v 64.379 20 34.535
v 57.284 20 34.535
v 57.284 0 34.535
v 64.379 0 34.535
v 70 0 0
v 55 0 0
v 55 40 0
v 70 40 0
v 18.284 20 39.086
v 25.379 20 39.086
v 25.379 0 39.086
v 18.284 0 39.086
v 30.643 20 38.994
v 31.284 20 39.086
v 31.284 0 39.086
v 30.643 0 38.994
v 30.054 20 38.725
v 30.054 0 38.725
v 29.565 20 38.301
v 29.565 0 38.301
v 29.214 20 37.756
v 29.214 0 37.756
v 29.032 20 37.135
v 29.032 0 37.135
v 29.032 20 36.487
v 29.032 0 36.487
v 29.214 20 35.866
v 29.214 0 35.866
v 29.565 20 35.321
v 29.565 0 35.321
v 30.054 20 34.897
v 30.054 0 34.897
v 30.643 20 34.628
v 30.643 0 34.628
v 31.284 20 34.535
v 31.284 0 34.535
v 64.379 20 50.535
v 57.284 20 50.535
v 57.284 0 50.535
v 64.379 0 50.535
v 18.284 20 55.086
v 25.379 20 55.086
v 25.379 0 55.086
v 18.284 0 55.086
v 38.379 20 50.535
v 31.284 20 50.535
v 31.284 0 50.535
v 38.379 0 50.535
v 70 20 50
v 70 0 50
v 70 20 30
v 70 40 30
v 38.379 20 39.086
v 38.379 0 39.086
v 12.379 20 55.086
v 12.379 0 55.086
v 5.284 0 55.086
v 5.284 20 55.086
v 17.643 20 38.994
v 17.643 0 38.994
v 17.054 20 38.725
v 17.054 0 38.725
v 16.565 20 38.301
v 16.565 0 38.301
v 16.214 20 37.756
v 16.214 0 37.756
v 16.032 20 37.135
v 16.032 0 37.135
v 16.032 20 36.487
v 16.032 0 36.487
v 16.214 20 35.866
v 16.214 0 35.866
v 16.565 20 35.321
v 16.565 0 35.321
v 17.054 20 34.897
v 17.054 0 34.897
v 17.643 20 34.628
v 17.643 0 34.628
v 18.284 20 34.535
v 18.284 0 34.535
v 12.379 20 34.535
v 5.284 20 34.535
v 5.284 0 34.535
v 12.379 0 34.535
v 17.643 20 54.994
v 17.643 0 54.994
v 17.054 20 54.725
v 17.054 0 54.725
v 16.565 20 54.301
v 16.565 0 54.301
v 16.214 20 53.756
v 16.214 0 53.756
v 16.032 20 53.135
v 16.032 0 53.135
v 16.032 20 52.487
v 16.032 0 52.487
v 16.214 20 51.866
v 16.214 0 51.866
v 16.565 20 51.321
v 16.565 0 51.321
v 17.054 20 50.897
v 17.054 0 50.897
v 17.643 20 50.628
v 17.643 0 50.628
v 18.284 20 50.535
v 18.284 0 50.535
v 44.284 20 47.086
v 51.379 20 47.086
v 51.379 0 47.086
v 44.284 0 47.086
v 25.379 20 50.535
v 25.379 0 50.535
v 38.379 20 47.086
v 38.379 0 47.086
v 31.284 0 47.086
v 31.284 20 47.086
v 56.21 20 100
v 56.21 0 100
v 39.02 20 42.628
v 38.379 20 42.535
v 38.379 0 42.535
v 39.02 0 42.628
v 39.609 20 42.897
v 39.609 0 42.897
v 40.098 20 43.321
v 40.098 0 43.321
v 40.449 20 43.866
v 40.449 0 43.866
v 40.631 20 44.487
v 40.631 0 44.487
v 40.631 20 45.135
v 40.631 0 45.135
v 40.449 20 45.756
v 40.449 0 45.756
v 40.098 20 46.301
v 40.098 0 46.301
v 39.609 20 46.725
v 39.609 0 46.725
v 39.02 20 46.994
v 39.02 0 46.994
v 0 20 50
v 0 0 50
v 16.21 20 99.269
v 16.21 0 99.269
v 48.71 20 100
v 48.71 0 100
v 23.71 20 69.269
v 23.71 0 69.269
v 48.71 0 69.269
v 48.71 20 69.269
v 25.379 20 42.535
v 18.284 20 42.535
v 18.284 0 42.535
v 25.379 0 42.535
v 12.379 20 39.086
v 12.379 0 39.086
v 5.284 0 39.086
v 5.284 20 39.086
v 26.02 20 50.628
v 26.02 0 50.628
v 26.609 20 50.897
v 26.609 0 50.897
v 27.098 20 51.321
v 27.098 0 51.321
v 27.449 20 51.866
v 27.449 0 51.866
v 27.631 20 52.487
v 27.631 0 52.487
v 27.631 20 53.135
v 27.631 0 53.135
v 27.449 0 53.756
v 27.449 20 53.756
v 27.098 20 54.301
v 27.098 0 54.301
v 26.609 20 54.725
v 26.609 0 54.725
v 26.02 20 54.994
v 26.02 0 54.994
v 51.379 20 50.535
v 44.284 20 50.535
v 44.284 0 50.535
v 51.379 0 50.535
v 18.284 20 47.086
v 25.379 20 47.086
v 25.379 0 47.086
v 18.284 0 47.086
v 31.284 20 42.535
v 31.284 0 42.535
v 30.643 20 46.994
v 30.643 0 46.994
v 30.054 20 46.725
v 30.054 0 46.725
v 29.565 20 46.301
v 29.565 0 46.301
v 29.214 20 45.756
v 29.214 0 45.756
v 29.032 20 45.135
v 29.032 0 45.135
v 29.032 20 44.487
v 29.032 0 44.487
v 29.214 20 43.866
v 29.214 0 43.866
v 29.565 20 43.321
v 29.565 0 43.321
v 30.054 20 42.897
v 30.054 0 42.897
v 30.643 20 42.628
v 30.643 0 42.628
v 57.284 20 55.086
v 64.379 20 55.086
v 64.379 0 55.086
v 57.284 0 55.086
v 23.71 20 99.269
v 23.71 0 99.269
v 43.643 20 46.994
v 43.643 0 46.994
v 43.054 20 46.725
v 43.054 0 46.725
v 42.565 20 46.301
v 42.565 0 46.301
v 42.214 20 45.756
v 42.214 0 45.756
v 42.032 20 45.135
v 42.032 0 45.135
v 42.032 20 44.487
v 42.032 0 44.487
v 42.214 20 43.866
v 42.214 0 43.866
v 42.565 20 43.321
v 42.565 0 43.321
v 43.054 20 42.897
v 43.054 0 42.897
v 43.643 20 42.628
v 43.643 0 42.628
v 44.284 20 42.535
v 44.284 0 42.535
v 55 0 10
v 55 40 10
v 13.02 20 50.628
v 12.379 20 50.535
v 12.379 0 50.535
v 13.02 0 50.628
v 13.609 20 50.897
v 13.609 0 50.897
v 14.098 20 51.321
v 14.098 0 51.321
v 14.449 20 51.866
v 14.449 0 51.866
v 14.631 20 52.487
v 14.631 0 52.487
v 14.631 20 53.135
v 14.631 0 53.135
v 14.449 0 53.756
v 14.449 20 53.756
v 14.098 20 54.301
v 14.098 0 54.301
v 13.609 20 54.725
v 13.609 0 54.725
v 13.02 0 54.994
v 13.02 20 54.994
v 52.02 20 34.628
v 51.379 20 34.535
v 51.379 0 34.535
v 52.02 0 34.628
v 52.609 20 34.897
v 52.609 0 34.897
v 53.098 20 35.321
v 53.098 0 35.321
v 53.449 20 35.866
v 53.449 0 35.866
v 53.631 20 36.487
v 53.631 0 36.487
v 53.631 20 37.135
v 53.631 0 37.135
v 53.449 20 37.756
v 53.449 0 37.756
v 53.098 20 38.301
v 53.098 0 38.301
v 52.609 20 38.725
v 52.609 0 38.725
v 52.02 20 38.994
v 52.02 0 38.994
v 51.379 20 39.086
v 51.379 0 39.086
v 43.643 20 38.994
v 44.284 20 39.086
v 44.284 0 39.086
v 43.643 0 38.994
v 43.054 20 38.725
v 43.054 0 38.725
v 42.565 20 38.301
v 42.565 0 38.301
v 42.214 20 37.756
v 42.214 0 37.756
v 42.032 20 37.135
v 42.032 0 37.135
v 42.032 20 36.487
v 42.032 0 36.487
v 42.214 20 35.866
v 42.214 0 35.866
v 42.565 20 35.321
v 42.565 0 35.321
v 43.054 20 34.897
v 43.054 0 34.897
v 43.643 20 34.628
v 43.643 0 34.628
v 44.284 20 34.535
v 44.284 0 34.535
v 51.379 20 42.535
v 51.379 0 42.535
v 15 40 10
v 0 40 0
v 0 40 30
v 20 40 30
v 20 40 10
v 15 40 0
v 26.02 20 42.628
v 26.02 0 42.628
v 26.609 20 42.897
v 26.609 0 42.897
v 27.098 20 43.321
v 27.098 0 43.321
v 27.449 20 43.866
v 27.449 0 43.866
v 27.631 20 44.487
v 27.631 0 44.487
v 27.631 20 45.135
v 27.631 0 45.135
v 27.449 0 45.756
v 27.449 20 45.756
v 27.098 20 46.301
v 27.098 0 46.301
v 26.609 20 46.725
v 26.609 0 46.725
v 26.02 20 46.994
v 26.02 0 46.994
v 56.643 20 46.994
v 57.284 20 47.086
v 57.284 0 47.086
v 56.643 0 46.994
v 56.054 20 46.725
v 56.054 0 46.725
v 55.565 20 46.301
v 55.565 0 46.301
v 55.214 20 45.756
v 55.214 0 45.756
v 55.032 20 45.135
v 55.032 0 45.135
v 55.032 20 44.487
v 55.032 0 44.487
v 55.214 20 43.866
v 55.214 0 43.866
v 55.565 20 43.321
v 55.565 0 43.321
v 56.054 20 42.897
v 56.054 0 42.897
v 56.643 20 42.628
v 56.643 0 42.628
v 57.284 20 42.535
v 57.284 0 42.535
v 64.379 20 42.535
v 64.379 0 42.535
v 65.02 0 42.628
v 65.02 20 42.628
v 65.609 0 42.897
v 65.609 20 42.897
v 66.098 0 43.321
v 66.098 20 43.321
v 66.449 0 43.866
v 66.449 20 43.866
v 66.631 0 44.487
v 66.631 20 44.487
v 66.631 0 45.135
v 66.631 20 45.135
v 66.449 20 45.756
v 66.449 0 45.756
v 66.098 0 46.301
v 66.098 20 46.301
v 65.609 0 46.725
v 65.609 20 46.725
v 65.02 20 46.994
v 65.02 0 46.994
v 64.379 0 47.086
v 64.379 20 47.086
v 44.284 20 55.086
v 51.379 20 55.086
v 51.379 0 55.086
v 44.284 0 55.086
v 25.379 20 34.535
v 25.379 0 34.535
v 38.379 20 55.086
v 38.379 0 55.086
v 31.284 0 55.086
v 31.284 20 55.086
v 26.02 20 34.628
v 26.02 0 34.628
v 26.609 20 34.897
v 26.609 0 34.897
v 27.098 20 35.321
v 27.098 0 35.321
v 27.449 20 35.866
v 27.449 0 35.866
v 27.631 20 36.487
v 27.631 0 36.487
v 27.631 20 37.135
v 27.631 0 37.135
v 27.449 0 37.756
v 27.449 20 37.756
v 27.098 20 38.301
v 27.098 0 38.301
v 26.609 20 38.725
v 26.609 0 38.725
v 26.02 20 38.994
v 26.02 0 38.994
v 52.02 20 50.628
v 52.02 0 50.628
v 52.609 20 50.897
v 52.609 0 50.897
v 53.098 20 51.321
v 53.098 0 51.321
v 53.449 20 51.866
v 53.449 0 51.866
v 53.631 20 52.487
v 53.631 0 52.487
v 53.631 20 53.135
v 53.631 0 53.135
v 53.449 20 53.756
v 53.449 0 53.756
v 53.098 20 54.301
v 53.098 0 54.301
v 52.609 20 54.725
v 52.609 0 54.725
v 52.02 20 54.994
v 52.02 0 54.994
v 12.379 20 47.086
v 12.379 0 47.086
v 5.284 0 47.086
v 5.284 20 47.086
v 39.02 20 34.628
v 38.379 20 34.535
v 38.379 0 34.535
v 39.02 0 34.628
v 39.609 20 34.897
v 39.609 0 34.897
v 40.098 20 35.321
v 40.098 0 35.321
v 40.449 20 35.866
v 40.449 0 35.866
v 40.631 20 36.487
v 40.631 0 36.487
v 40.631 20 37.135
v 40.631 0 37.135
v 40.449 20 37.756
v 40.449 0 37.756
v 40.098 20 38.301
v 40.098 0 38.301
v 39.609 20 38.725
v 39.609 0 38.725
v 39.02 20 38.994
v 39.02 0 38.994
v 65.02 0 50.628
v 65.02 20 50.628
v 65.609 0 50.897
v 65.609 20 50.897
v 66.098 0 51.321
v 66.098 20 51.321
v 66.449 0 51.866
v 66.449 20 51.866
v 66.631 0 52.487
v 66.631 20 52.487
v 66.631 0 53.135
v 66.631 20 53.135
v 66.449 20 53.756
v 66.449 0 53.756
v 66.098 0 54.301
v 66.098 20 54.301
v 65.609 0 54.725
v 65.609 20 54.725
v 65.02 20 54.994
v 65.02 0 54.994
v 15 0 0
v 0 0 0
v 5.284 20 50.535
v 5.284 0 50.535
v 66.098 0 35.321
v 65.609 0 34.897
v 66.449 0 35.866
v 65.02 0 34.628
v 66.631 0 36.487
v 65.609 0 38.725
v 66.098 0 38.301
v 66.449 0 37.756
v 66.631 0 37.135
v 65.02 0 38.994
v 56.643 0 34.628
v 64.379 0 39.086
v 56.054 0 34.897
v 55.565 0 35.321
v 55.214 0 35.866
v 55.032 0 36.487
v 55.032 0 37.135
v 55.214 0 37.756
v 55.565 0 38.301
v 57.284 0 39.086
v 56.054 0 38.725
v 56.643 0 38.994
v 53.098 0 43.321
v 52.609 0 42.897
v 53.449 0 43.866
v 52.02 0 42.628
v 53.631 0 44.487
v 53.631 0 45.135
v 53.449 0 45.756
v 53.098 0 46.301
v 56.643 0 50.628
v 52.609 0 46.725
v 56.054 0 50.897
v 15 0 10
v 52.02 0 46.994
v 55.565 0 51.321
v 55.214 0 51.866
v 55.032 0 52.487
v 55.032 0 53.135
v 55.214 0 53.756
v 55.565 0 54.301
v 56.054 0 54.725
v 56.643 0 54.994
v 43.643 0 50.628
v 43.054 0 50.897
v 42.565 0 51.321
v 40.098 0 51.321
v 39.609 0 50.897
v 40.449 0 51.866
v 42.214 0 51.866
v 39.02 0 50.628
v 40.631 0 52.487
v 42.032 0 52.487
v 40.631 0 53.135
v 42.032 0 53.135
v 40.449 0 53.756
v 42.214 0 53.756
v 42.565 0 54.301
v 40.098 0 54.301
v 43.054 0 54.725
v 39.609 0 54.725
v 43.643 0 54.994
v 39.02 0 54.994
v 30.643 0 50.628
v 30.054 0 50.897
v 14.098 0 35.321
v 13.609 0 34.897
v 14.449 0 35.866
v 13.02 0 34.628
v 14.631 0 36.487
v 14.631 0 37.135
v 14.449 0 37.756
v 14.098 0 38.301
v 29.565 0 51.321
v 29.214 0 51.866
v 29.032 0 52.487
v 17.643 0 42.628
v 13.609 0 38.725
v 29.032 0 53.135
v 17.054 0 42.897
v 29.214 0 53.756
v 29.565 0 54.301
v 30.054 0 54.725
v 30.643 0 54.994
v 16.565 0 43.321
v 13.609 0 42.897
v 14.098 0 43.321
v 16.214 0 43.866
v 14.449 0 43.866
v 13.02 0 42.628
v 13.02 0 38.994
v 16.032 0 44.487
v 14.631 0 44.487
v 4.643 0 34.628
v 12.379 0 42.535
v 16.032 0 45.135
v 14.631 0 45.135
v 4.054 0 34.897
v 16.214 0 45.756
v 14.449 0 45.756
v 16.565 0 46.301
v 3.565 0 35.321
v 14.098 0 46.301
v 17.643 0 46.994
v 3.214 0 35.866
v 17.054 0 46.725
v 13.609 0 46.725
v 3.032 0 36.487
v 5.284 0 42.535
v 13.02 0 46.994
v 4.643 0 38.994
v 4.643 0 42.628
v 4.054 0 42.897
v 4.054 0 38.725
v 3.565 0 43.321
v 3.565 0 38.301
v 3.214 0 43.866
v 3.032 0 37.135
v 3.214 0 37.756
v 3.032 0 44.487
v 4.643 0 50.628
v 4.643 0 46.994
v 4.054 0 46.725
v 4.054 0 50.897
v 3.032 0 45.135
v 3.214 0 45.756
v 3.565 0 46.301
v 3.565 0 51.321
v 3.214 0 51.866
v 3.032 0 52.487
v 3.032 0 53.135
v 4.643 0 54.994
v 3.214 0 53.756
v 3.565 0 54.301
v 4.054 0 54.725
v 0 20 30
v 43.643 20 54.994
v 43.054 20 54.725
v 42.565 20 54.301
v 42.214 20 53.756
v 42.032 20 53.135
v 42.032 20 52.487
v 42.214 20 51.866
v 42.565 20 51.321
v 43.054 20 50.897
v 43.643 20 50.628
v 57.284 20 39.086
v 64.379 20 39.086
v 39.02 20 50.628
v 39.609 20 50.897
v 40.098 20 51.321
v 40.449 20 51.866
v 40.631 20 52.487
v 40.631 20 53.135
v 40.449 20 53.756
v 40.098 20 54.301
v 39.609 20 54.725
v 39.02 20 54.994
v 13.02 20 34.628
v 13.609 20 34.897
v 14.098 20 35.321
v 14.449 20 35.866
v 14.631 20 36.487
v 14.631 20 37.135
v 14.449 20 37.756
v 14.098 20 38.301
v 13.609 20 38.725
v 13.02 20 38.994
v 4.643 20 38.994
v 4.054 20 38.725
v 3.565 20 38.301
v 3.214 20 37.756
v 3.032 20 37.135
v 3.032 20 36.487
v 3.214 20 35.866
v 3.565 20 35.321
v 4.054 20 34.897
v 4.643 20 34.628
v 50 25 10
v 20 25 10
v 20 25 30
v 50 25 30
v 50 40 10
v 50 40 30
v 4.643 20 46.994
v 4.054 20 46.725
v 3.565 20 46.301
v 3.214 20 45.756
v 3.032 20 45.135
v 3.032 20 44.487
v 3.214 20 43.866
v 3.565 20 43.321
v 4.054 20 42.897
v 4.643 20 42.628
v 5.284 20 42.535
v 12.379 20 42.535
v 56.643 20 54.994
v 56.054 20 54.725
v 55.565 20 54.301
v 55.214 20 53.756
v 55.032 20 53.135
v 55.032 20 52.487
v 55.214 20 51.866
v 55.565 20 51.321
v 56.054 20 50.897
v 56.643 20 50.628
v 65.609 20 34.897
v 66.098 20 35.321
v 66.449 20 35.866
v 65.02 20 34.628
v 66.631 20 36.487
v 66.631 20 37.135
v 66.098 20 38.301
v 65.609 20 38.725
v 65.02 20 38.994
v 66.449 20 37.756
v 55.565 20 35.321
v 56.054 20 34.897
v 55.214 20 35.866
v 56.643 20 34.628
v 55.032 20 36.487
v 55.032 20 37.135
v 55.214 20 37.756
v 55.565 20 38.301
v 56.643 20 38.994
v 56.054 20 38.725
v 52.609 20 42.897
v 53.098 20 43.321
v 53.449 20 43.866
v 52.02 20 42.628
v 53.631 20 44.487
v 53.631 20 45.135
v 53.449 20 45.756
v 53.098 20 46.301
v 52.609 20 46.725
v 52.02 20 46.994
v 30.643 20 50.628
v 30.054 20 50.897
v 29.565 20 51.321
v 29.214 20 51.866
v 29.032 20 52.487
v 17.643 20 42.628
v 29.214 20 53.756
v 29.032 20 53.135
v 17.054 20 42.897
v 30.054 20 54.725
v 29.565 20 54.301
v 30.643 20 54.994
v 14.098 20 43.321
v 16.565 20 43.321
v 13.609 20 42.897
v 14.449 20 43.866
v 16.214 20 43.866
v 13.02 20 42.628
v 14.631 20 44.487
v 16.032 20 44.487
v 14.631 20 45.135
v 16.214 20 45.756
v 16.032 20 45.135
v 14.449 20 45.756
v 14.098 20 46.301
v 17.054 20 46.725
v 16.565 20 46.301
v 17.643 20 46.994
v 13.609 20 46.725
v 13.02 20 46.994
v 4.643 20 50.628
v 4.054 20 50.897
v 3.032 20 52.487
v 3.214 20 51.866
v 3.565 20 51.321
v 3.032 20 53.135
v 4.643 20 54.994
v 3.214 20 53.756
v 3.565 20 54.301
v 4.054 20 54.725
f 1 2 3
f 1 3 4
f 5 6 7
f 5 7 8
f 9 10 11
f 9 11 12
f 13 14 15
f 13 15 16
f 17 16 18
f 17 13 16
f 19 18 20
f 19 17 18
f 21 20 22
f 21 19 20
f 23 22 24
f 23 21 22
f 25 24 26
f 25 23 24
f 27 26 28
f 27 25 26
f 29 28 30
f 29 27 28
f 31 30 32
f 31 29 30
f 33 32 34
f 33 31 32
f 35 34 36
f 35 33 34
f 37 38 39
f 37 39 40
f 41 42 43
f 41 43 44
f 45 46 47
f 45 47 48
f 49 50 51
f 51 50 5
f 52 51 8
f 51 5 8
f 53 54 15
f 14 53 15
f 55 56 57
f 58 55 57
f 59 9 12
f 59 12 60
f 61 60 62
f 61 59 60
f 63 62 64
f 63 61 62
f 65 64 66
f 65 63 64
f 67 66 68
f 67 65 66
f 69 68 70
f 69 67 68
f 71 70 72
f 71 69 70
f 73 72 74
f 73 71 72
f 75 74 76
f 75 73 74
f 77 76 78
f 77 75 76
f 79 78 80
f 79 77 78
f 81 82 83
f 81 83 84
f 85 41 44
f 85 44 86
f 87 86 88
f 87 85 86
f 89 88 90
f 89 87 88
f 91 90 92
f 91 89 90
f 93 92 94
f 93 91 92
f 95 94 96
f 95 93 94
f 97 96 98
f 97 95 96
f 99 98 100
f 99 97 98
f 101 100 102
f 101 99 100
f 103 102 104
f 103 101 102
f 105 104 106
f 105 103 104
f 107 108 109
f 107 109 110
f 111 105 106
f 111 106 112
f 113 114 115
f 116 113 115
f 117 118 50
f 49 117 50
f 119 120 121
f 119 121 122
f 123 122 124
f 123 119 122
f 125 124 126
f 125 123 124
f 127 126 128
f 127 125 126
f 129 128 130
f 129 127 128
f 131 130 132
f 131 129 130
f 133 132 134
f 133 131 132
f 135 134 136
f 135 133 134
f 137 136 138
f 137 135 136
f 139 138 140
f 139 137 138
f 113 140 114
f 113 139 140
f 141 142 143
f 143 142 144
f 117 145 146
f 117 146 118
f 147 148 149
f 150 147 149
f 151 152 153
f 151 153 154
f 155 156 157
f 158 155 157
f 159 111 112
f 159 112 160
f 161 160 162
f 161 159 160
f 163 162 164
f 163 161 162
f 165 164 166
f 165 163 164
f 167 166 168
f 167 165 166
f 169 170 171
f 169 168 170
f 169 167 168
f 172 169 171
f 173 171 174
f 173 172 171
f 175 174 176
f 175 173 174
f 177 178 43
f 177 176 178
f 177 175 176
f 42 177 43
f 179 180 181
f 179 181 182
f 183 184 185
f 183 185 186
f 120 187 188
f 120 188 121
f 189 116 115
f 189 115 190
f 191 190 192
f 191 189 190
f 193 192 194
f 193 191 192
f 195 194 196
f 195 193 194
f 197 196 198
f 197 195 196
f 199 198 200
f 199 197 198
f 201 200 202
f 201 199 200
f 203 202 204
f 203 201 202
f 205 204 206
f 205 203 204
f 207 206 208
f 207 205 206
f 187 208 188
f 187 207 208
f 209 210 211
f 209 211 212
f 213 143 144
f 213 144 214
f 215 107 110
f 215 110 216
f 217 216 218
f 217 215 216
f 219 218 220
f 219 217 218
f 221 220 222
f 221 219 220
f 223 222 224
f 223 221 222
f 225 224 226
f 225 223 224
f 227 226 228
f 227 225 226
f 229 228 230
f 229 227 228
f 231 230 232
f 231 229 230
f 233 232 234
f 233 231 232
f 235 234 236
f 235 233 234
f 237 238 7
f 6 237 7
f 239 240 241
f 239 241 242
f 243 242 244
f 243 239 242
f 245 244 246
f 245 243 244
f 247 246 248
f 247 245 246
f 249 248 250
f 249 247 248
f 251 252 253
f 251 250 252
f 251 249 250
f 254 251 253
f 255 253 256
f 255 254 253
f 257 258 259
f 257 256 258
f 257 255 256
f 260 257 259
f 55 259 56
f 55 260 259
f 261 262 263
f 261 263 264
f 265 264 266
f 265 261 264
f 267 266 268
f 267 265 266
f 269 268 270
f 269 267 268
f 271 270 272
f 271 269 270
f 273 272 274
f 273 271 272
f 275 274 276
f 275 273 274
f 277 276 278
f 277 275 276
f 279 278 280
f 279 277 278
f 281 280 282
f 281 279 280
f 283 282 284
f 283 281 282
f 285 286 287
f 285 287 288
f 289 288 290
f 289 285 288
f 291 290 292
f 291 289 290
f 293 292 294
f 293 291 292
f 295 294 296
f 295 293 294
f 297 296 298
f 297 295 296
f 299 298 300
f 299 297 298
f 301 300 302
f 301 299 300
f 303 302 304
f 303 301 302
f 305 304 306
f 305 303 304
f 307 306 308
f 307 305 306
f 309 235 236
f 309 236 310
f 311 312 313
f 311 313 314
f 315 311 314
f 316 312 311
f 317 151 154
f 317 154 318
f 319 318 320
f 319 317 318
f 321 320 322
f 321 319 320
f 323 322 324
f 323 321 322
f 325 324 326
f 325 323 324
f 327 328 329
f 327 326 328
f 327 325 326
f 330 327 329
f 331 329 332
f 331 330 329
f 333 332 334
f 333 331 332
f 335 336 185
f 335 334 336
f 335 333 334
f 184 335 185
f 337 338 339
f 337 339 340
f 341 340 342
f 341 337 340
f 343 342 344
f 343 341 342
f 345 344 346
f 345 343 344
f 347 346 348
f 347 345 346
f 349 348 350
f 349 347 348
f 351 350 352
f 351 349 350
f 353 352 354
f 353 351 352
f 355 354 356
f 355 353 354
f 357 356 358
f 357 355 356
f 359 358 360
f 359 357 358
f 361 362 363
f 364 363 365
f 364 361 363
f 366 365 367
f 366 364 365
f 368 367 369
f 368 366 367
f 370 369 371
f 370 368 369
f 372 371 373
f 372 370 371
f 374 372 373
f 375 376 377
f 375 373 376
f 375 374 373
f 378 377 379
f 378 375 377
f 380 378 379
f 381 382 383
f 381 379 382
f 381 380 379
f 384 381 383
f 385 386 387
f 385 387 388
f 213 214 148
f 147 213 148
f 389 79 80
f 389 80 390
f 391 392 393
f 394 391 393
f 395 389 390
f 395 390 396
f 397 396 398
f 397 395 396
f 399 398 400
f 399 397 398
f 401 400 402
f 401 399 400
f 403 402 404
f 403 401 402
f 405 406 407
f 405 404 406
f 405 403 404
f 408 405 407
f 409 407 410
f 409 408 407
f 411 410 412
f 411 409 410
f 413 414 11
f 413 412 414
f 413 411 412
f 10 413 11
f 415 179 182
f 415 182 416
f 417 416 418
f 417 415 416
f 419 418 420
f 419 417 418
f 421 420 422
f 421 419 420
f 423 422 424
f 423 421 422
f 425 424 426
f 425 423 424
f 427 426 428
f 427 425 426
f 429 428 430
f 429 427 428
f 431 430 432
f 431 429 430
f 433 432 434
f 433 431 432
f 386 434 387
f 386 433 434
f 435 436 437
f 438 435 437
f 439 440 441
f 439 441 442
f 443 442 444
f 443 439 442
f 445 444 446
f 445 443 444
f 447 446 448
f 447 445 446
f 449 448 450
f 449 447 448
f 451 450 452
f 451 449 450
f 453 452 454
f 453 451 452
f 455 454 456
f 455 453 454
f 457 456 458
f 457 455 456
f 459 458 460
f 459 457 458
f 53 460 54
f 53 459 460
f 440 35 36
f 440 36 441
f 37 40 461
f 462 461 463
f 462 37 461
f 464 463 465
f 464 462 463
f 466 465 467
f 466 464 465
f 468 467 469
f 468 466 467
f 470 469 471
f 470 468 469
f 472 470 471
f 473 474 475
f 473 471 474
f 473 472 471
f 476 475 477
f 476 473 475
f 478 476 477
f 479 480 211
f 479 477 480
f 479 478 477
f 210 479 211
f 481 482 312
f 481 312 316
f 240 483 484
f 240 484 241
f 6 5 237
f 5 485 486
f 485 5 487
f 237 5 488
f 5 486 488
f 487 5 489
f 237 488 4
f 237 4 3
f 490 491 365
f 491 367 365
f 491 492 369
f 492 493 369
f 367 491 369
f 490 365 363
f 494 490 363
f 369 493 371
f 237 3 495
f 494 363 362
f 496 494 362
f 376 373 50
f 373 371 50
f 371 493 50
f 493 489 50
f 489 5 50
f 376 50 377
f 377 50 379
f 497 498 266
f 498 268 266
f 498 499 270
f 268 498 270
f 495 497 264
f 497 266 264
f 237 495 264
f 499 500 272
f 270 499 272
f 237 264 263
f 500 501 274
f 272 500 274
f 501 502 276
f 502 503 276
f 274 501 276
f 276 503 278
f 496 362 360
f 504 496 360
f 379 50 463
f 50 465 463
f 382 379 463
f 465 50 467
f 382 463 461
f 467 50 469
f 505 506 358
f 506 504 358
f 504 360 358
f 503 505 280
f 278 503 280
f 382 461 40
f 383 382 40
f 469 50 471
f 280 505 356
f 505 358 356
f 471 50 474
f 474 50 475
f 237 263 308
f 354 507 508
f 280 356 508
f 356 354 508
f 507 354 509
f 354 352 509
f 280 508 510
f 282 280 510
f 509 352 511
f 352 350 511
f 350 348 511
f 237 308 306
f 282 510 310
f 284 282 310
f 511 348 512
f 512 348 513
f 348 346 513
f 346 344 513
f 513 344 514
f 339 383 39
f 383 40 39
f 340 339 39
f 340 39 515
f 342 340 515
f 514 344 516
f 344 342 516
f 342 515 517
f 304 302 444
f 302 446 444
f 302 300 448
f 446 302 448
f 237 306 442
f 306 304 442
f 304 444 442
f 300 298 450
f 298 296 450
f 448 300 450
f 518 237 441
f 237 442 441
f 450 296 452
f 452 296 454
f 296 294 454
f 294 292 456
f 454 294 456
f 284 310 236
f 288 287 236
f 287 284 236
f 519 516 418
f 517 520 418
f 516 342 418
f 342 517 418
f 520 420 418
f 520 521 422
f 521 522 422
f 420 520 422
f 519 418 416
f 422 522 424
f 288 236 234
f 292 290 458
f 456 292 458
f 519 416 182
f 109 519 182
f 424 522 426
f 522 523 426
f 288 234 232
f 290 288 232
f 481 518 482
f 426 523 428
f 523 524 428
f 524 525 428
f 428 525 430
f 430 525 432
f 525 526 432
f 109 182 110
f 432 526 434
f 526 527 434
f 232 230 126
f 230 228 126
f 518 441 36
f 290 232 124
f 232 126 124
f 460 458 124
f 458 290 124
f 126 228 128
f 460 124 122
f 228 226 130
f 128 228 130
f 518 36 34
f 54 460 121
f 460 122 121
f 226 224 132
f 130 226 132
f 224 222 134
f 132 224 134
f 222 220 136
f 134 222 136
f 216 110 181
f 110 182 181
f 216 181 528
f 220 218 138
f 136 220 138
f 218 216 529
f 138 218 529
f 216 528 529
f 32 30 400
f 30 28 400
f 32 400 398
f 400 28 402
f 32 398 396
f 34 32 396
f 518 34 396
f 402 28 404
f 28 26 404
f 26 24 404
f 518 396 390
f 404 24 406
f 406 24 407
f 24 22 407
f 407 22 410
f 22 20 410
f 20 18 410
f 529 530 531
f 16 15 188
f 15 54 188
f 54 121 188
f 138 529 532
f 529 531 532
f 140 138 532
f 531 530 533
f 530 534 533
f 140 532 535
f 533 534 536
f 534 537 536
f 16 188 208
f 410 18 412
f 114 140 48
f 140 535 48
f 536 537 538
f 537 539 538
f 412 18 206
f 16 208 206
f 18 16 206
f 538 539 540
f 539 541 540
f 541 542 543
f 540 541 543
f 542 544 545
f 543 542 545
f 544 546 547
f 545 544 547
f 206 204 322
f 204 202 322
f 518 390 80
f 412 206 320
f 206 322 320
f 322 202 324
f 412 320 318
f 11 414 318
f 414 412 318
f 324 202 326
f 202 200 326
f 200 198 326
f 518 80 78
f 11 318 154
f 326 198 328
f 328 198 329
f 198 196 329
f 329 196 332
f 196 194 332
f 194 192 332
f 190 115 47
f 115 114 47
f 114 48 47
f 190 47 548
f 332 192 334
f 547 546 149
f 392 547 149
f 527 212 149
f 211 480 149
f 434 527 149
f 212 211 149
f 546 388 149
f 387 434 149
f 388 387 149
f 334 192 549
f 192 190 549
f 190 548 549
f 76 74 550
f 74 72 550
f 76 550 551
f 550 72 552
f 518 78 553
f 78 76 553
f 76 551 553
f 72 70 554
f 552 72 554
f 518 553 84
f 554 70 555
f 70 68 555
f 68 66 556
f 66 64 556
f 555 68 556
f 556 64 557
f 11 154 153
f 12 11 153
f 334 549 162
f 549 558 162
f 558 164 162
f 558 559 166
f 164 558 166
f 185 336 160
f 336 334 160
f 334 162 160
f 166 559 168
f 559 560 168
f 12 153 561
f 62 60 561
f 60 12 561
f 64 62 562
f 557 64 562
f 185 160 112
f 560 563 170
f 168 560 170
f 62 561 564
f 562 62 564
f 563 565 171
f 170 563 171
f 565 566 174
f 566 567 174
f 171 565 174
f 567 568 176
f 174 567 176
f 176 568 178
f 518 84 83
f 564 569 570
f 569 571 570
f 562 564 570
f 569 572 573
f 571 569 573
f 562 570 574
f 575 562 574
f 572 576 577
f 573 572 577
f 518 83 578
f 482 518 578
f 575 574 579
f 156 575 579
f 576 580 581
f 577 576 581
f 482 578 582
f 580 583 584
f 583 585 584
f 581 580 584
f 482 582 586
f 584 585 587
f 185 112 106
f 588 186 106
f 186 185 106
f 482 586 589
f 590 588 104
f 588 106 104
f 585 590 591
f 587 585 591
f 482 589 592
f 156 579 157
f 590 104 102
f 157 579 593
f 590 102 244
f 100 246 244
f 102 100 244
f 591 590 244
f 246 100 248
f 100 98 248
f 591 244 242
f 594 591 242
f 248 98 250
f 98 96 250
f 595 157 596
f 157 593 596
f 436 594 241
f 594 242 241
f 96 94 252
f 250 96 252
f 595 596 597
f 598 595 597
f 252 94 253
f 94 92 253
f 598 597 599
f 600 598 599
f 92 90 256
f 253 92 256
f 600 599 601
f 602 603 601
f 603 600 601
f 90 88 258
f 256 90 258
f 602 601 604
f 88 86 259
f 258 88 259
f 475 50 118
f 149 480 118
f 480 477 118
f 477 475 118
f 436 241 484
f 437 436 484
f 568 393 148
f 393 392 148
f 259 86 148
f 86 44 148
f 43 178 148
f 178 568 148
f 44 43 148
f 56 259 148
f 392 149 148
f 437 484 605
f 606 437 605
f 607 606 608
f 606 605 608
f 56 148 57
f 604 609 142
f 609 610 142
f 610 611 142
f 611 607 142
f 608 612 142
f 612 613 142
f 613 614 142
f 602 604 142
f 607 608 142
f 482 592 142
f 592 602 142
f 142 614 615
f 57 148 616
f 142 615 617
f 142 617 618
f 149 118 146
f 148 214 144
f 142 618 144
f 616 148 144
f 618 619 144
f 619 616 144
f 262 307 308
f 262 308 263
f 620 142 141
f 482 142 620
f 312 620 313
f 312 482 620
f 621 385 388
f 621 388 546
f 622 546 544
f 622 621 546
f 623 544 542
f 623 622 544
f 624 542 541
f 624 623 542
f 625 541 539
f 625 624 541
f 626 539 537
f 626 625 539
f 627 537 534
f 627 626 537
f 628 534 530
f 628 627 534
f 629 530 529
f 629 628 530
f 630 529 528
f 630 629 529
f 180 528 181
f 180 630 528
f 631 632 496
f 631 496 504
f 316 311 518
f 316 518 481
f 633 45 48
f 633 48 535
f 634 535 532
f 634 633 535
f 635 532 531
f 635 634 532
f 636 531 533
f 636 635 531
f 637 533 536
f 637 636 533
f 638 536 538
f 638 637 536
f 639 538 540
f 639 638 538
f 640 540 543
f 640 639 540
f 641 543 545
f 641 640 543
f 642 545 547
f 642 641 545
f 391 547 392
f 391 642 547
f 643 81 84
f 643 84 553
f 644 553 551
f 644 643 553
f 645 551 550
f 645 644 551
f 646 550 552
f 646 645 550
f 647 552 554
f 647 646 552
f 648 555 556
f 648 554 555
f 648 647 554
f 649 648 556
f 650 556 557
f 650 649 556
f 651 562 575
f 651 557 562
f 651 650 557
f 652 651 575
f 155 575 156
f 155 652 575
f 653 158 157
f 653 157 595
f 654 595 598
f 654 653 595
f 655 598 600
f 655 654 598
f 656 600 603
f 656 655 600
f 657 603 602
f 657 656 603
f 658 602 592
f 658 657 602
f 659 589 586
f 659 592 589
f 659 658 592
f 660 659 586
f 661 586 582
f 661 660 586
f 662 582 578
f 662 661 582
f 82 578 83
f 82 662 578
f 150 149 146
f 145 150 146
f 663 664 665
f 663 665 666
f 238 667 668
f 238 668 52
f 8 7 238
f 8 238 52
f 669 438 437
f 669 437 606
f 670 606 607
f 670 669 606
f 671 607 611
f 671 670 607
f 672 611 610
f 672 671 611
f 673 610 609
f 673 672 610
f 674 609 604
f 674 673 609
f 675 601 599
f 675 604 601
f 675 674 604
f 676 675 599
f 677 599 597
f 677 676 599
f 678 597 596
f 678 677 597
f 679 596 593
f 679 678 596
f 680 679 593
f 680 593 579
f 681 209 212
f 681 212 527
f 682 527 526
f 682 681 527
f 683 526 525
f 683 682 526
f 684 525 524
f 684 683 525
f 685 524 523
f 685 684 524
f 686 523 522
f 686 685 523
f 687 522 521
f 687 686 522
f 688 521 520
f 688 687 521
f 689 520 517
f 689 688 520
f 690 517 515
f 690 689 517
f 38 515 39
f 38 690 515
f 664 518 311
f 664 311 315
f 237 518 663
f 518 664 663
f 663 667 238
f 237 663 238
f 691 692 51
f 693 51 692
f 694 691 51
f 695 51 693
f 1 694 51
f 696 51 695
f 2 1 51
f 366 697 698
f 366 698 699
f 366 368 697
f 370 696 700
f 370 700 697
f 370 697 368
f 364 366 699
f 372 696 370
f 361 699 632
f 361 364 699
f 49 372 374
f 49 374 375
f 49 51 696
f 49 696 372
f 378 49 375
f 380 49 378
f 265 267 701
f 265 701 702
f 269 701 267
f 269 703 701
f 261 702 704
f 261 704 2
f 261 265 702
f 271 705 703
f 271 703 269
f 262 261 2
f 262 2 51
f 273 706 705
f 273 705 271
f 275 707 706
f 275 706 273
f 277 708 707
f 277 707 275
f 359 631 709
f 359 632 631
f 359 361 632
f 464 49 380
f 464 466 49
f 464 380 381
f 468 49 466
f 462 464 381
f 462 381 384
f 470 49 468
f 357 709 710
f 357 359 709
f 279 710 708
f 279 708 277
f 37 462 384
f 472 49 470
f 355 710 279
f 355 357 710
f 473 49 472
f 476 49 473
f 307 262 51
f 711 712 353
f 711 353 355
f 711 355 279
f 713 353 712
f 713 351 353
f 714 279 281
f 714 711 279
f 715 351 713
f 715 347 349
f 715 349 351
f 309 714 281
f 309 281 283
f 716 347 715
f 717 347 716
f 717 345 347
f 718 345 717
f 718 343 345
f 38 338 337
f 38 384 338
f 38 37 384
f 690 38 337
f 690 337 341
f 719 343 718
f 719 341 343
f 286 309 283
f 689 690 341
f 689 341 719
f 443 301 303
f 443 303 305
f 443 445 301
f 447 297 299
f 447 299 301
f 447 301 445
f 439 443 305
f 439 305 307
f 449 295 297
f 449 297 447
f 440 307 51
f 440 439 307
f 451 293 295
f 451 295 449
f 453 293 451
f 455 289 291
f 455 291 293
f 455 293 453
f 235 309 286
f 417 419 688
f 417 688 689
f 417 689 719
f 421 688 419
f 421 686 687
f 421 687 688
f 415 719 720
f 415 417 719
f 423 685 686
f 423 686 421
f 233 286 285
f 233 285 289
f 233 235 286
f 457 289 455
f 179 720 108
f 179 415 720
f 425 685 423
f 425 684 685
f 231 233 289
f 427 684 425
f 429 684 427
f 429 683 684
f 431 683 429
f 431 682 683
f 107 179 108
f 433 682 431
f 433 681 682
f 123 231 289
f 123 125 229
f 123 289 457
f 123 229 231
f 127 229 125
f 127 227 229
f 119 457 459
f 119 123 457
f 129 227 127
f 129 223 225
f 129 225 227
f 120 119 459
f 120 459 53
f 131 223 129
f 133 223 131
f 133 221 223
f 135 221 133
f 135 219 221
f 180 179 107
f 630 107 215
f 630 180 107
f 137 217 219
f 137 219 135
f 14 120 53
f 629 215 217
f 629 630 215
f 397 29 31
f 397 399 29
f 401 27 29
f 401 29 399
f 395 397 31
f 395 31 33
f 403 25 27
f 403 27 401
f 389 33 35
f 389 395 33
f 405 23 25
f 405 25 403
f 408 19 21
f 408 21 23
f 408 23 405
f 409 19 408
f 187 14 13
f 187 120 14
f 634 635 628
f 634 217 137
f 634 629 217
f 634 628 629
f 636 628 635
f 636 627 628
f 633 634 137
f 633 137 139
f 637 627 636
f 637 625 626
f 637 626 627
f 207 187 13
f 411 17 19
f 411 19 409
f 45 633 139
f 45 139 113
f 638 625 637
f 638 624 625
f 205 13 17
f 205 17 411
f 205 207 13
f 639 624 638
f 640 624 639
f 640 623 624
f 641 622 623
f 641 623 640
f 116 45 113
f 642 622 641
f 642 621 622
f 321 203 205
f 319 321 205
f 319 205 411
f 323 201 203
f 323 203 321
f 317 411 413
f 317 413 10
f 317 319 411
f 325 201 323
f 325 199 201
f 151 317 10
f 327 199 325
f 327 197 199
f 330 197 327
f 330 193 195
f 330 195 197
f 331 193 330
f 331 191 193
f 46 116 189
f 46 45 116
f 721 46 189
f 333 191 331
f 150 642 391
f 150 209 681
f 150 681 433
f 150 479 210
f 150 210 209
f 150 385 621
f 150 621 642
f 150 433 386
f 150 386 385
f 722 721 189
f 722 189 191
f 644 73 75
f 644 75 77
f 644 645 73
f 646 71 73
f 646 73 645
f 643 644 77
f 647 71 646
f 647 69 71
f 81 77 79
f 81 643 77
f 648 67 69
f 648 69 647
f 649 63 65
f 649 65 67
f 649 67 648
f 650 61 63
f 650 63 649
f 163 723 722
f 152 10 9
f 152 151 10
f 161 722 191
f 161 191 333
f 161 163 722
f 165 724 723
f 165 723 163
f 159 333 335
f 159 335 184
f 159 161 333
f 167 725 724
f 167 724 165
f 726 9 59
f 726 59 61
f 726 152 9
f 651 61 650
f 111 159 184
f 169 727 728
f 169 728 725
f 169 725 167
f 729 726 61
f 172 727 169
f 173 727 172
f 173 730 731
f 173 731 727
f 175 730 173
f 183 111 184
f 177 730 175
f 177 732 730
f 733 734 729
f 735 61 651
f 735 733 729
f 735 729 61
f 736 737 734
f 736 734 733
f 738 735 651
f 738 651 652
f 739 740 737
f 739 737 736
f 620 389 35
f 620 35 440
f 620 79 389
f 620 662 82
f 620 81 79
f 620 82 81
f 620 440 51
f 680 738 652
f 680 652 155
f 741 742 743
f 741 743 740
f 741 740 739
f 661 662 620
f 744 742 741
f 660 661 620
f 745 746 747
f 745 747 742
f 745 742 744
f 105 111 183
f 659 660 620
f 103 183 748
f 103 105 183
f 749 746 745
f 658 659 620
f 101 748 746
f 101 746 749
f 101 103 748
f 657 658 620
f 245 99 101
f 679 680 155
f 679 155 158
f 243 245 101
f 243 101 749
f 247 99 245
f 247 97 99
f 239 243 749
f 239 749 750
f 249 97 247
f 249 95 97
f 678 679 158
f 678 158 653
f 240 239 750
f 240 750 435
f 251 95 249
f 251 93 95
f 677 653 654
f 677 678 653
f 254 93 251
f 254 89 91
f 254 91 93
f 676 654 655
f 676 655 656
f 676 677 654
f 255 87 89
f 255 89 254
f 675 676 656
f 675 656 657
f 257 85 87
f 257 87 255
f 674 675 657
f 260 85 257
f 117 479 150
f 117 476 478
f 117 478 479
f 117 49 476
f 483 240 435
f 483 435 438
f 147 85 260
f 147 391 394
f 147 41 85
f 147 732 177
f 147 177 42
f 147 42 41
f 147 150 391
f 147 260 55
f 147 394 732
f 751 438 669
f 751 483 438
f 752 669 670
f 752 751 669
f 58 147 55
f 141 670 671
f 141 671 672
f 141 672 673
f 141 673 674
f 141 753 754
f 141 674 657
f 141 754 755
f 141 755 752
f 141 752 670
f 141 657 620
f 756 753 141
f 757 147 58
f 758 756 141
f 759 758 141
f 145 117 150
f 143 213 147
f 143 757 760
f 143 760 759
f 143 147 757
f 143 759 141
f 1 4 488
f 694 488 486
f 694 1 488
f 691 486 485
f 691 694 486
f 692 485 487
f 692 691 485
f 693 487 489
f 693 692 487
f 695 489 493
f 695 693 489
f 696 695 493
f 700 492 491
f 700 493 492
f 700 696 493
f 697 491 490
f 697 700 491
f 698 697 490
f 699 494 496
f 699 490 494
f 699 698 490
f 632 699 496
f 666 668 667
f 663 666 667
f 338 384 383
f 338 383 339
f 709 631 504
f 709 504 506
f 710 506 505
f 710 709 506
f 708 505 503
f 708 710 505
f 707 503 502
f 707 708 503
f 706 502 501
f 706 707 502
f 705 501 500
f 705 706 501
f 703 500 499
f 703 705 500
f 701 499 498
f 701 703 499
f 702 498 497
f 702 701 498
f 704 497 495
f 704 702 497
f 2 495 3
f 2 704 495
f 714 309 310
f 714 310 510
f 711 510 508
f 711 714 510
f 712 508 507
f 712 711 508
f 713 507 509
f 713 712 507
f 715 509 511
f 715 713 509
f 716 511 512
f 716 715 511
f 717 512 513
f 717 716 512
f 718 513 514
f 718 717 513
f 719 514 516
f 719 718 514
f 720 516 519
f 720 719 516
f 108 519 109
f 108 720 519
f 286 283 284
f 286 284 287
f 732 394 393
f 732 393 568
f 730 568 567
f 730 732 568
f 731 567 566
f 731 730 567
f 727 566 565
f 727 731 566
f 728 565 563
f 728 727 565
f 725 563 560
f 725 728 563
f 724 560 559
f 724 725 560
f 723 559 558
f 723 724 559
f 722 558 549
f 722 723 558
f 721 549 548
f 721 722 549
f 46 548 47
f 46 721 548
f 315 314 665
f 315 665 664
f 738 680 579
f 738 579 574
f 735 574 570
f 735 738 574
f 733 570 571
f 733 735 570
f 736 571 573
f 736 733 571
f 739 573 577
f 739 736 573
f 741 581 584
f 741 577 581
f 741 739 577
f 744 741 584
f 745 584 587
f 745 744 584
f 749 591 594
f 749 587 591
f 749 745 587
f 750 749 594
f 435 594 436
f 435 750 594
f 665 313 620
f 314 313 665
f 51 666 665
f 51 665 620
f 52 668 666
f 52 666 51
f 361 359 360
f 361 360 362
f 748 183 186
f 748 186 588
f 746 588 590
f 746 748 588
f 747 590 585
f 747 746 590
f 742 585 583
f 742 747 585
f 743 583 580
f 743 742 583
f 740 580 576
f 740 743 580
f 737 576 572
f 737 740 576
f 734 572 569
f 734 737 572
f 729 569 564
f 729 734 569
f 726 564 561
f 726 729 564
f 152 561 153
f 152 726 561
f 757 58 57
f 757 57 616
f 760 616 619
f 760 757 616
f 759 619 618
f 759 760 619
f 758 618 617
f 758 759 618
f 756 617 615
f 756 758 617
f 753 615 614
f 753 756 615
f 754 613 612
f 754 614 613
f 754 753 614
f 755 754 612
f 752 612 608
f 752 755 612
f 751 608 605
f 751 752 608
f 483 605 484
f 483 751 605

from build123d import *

# Parameters (mm, degrees)
SKETCH2_W           = 70
SKETCH2_H           = 40
BOSS_EXTRUDE1_DEPTH = 50
SKETCH3_W           = 40
SKETCH3_H           = 10
CUT_EXTRUDE1_DEPTH  = 40
SKETCH4_W           = 30
SKETCH4_H           = 40
CUT_EXTRUDE2_DEPTH  = 15
SKETCH5_W           = 70
SKETCH5_H           = 20
CUT_EXTRUDE3_DEPTH  = 20
BOSS_EXTRUDE2_DEPTH = 20
CUT_EXTRUDE4_DEPTH  = 124.693168769


with BuildPart() as part:
    # Sketch2 → Boss-Extrude1 (new body)
    with BuildSketch(Plane.XY):
        with Locations((35, 20)):
            Rectangle(SKETCH2_W, SKETCH2_H)
    extrude(amount=BOSS_EXTRUDE1_DEPTH)

    # Sketch3 → Cut-Extrude1 (cut)
    with BuildSketch(Plane(origin=(0, 40, 0), x_dir=(1, 0, 0), z_dir=(0, 1, 0))):
        with Locations((35, -5)):
            Rectangle(SKETCH3_W, SKETCH3_H)
    extrude(amount=-CUT_EXTRUDE1_DEPTH, mode=Mode.SUBTRACT)

    # Sketch4 → Cut-Extrude2 (cut)
    with BuildSketch(Plane(origin=(0, 40, 0), x_dir=(1, 0, 0), z_dir=(0, 1, 0))):
        with Locations((35, -30)):
            Rectangle(SKETCH4_W, SKETCH4_H)
    extrude(amount=-CUT_EXTRUDE2_DEPTH, mode=Mode.SUBTRACT)

    # Sketch5 → Cut-Extrude3 (cut)
    with BuildSketch(Plane(origin=(0, 40, 0), x_dir=(1, 0, 0), z_dir=(0, 1, 0))):
        with Locations((35, -40)):
            Rectangle(SKETCH5_W, SKETCH5_H)
    extrude(amount=-CUT_EXTRUDE3_DEPTH, mode=Mode.SUBTRACT)

    # Sketch6 → Boss-Extrude2 (add)
    with BuildSketch(Plane.XZ):
        Polygon((0, 50), (16.209807748, 99.268768354), (23.709807748, 99.268768354), (23.709807748, 69.268768354), (48.709807748, 69.268768354), (48.709807748, 100), (56.209807748, 100), (70, 50), align=None)
    extrude(amount=-BOSS_EXTRUDE2_DEPTH)

    # Sketch7 → Cut-Extrude4 (cut, through all)
    with BuildSketch(Plane(origin=(0, 20, 0), x_dir=(1, 0, 0), z_dir=(0, 1, 0))):
        with BuildLine():
            Line((5.284369051, -34.535416774), (12.378641305, -34.535416774))
            ThreePointArc((12.378641305, -34.535416774), (14.654162594, -36.810938063), (12.378641305, -39.086459352))
            Line((12.378641305, -39.086459352), (5.284369051, -39.086459352))
            ThreePointArc((5.284369051, -39.086459352), (3.008847762, -36.810938063), (5.284369051, -34.535416774))
        make_face()
        with BuildLine():
            Line((18.284369051, -34.535416774), (25.378641305, -34.535416774))
            ThreePointArc((25.378641305, -34.535416774), (27.654162594, -36.810938063), (25.378641305, -39.086459352))
            Line((25.378641305, -39.086459352), (18.284369051, -39.086459352))
            ThreePointArc((18.284369051, -39.086459352), (16.008847762, -36.810938063), (18.284369051, -34.535416774))
        make_face()
        with BuildLine():
            Line((31.284369051, -34.535416774), (38.378641305, -34.535416774))
            ThreePointArc((38.378641305, -34.535416774), (40.654162594, -36.810938063), (38.378641305, -39.086459352))
            Line((38.378641305, -39.086459352), (31.284369051, -39.086459352))
            ThreePointArc((31.284369051, -39.086459352), (29.008847762, -36.810938063), (31.284369051, -34.535416774))
        make_face()
        with BuildLine():
            Line((44.284369051, -34.535416774), (51.378641305, -34.535416774))
            ThreePointArc((51.378641305, -34.535416774), (53.654162594, -36.810938063), (51.378641305, -39.086459352))
            Line((51.378641305, -39.086459352), (44.284369051, -39.086459352))
            ThreePointArc((44.284369051, -39.086459352), (42.008847762, -36.810938063), (44.284369051, -34.535416774))
        make_face()
        with BuildLine():
            Line((57.284369051, -34.535416774), (64.378641305, -34.535416774))
            ThreePointArc((64.378641305, -34.535416774), (66.654162594, -36.810938063), (64.378641305, -39.086459352))
            Line((64.378641305, -39.086459352), (57.284369051, -39.086459352))
            ThreePointArc((57.284369051, -39.086459352), (55.008847762, -36.810938063), (57.284369051, -34.535416774))
        make_face()
        with BuildLine():
            Line((18.284369051, -42.535416774), (25.378641305, -42.535416774))
            ThreePointArc((25.378641305, -42.535416774), (27.654162594, -44.810938063), (25.378641305, -47.086459352))
            Line((25.378641305, -47.086459352), (18.284369051, -47.086459352))
            ThreePointArc((18.284369051, -47.086459352), (16.008847762, -44.810938063), (18.284369051, -42.535416774))
        make_face()
        with BuildLine():
            Line((31.284369051, -42.535416774), (38.378641305, -42.535416774))
            ThreePointArc((38.378641305, -42.535416774), (40.654162594, -44.810938063), (38.378641305, -47.086459352))
            Line((38.378641305, -47.086459352), (31.284369051, -47.086459352))
            ThreePointArc((31.284369051, -47.086459352), (29.008847762, -44.810938063), (31.284369051, -42.535416774))
        make_face()
        with BuildLine():
            Line((44.284369051, -42.535416774), (51.378641305, -42.535416774))
            ThreePointArc((51.378641305, -42.535416774), (53.654162594, -44.810938063), (51.378641305, -47.086459352))
            Line((51.378641305, -47.086459352), (44.284369051, -47.086459352))
            ThreePointArc((44.284369051, -47.086459352), (42.008847762, -44.810938063), (44.284369051, -42.535416774))
        make_face()
        with BuildLine():
            Line((57.284369051, -42.535416774), (64.378641305, -42.535416774))
            ThreePointArc((64.378641305, -42.535416774), (66.654162594, -44.810938063), (64.378641305, -47.086459352))
            Line((64.378641305, -47.086459352), (57.284369051, -47.086459352))
            ThreePointArc((57.284369051, -47.086459352), (55.008847762, -44.810938063), (57.284369051, -42.535416774))
        make_face()
        with BuildLine():
            Line((18.284369051, -50.535416774), (25.378641305, -50.535416774))
            ThreePointArc((25.378641305, -50.535416774), (27.654162594, -52.810938063), (25.378641305, -55.086459352))
            Line((25.378641305, -55.086459352), (18.284369051, -55.086459352))
            ThreePointArc((18.284369051, -55.086459352), (16.008847762, -52.810938063), (18.284369051, -50.535416774))
        make_face()
        with BuildLine():
            Line((31.284369051, -50.535416774), (38.378641305, -50.535416774))
            ThreePointArc((38.378641305, -50.535416774), (40.654162594, -52.810938063), (38.378641305, -55.086459352))
            Line((38.378641305, -55.086459352), (31.284369051, -55.086459352))
            ThreePointArc((31.284369051, -55.086459352), (29.008847762, -52.810938063), (31.284369051, -50.535416774))
        make_face()
        with BuildLine():
            Line((44.284369051, -50.535416774), (51.378641305, -50.535416774))
            ThreePointArc((51.378641305, -50.535416774), (53.654162594, -52.810938063), (51.378641305, -55.086459352))
            Line((51.378641305, -55.086459352), (44.284369051, -55.086459352))
            ThreePointArc((44.284369051, -55.086459352), (42.008847762, -52.810938063), (44.284369051, -50.535416774))
        make_face()
        with BuildLine():
            Line((57.284369051, -50.535416774), (64.378641305, -50.535416774))
            ThreePointArc((64.378641305, -50.535416774), (66.654162594, -52.810938063), (64.378641305, -55.086459352))
            Line((64.378641305, -55.086459352), (57.284369051, -55.086459352))
            ThreePointArc((57.284369051, -55.086459352), (55.008847762, -52.810938063), (57.284369051, -50.535416774))
        make_face()
        with BuildLine():
            Line((5.284369051, -42.535416774), (12.378641305, -42.535416774))
            ThreePointArc((12.378641305, -42.535416774), (14.654162594, -44.810938063), (12.378641305, -47.086459352))
            Line((12.378641305, -47.086459352), (5.284369051, -47.086459352))
            ThreePointArc((5.284369051, -47.086459352), (3.008847762, -44.810938063), (5.284369051, -42.535416774))
        make_face()
        with BuildLine():
            Line((5.284369051, -50.535416774), (12.378641305, -50.535416774))
            ThreePointArc((12.378641305, -50.535416774), (14.654162594, -52.810938063), (12.378641305, -55.086459352))
            Line((12.378641305, -55.086459352), (5.284369051, -55.086459352))
            ThreePointArc((5.284369051, -55.086459352), (3.008847762, -52.810938063), (5.284369051, -50.535416774))
        make_face()
    extrude(amount=-CUT_EXTRUDE4_DEPTH, mode=Mode.SUBTRACT)


solid = part.part
